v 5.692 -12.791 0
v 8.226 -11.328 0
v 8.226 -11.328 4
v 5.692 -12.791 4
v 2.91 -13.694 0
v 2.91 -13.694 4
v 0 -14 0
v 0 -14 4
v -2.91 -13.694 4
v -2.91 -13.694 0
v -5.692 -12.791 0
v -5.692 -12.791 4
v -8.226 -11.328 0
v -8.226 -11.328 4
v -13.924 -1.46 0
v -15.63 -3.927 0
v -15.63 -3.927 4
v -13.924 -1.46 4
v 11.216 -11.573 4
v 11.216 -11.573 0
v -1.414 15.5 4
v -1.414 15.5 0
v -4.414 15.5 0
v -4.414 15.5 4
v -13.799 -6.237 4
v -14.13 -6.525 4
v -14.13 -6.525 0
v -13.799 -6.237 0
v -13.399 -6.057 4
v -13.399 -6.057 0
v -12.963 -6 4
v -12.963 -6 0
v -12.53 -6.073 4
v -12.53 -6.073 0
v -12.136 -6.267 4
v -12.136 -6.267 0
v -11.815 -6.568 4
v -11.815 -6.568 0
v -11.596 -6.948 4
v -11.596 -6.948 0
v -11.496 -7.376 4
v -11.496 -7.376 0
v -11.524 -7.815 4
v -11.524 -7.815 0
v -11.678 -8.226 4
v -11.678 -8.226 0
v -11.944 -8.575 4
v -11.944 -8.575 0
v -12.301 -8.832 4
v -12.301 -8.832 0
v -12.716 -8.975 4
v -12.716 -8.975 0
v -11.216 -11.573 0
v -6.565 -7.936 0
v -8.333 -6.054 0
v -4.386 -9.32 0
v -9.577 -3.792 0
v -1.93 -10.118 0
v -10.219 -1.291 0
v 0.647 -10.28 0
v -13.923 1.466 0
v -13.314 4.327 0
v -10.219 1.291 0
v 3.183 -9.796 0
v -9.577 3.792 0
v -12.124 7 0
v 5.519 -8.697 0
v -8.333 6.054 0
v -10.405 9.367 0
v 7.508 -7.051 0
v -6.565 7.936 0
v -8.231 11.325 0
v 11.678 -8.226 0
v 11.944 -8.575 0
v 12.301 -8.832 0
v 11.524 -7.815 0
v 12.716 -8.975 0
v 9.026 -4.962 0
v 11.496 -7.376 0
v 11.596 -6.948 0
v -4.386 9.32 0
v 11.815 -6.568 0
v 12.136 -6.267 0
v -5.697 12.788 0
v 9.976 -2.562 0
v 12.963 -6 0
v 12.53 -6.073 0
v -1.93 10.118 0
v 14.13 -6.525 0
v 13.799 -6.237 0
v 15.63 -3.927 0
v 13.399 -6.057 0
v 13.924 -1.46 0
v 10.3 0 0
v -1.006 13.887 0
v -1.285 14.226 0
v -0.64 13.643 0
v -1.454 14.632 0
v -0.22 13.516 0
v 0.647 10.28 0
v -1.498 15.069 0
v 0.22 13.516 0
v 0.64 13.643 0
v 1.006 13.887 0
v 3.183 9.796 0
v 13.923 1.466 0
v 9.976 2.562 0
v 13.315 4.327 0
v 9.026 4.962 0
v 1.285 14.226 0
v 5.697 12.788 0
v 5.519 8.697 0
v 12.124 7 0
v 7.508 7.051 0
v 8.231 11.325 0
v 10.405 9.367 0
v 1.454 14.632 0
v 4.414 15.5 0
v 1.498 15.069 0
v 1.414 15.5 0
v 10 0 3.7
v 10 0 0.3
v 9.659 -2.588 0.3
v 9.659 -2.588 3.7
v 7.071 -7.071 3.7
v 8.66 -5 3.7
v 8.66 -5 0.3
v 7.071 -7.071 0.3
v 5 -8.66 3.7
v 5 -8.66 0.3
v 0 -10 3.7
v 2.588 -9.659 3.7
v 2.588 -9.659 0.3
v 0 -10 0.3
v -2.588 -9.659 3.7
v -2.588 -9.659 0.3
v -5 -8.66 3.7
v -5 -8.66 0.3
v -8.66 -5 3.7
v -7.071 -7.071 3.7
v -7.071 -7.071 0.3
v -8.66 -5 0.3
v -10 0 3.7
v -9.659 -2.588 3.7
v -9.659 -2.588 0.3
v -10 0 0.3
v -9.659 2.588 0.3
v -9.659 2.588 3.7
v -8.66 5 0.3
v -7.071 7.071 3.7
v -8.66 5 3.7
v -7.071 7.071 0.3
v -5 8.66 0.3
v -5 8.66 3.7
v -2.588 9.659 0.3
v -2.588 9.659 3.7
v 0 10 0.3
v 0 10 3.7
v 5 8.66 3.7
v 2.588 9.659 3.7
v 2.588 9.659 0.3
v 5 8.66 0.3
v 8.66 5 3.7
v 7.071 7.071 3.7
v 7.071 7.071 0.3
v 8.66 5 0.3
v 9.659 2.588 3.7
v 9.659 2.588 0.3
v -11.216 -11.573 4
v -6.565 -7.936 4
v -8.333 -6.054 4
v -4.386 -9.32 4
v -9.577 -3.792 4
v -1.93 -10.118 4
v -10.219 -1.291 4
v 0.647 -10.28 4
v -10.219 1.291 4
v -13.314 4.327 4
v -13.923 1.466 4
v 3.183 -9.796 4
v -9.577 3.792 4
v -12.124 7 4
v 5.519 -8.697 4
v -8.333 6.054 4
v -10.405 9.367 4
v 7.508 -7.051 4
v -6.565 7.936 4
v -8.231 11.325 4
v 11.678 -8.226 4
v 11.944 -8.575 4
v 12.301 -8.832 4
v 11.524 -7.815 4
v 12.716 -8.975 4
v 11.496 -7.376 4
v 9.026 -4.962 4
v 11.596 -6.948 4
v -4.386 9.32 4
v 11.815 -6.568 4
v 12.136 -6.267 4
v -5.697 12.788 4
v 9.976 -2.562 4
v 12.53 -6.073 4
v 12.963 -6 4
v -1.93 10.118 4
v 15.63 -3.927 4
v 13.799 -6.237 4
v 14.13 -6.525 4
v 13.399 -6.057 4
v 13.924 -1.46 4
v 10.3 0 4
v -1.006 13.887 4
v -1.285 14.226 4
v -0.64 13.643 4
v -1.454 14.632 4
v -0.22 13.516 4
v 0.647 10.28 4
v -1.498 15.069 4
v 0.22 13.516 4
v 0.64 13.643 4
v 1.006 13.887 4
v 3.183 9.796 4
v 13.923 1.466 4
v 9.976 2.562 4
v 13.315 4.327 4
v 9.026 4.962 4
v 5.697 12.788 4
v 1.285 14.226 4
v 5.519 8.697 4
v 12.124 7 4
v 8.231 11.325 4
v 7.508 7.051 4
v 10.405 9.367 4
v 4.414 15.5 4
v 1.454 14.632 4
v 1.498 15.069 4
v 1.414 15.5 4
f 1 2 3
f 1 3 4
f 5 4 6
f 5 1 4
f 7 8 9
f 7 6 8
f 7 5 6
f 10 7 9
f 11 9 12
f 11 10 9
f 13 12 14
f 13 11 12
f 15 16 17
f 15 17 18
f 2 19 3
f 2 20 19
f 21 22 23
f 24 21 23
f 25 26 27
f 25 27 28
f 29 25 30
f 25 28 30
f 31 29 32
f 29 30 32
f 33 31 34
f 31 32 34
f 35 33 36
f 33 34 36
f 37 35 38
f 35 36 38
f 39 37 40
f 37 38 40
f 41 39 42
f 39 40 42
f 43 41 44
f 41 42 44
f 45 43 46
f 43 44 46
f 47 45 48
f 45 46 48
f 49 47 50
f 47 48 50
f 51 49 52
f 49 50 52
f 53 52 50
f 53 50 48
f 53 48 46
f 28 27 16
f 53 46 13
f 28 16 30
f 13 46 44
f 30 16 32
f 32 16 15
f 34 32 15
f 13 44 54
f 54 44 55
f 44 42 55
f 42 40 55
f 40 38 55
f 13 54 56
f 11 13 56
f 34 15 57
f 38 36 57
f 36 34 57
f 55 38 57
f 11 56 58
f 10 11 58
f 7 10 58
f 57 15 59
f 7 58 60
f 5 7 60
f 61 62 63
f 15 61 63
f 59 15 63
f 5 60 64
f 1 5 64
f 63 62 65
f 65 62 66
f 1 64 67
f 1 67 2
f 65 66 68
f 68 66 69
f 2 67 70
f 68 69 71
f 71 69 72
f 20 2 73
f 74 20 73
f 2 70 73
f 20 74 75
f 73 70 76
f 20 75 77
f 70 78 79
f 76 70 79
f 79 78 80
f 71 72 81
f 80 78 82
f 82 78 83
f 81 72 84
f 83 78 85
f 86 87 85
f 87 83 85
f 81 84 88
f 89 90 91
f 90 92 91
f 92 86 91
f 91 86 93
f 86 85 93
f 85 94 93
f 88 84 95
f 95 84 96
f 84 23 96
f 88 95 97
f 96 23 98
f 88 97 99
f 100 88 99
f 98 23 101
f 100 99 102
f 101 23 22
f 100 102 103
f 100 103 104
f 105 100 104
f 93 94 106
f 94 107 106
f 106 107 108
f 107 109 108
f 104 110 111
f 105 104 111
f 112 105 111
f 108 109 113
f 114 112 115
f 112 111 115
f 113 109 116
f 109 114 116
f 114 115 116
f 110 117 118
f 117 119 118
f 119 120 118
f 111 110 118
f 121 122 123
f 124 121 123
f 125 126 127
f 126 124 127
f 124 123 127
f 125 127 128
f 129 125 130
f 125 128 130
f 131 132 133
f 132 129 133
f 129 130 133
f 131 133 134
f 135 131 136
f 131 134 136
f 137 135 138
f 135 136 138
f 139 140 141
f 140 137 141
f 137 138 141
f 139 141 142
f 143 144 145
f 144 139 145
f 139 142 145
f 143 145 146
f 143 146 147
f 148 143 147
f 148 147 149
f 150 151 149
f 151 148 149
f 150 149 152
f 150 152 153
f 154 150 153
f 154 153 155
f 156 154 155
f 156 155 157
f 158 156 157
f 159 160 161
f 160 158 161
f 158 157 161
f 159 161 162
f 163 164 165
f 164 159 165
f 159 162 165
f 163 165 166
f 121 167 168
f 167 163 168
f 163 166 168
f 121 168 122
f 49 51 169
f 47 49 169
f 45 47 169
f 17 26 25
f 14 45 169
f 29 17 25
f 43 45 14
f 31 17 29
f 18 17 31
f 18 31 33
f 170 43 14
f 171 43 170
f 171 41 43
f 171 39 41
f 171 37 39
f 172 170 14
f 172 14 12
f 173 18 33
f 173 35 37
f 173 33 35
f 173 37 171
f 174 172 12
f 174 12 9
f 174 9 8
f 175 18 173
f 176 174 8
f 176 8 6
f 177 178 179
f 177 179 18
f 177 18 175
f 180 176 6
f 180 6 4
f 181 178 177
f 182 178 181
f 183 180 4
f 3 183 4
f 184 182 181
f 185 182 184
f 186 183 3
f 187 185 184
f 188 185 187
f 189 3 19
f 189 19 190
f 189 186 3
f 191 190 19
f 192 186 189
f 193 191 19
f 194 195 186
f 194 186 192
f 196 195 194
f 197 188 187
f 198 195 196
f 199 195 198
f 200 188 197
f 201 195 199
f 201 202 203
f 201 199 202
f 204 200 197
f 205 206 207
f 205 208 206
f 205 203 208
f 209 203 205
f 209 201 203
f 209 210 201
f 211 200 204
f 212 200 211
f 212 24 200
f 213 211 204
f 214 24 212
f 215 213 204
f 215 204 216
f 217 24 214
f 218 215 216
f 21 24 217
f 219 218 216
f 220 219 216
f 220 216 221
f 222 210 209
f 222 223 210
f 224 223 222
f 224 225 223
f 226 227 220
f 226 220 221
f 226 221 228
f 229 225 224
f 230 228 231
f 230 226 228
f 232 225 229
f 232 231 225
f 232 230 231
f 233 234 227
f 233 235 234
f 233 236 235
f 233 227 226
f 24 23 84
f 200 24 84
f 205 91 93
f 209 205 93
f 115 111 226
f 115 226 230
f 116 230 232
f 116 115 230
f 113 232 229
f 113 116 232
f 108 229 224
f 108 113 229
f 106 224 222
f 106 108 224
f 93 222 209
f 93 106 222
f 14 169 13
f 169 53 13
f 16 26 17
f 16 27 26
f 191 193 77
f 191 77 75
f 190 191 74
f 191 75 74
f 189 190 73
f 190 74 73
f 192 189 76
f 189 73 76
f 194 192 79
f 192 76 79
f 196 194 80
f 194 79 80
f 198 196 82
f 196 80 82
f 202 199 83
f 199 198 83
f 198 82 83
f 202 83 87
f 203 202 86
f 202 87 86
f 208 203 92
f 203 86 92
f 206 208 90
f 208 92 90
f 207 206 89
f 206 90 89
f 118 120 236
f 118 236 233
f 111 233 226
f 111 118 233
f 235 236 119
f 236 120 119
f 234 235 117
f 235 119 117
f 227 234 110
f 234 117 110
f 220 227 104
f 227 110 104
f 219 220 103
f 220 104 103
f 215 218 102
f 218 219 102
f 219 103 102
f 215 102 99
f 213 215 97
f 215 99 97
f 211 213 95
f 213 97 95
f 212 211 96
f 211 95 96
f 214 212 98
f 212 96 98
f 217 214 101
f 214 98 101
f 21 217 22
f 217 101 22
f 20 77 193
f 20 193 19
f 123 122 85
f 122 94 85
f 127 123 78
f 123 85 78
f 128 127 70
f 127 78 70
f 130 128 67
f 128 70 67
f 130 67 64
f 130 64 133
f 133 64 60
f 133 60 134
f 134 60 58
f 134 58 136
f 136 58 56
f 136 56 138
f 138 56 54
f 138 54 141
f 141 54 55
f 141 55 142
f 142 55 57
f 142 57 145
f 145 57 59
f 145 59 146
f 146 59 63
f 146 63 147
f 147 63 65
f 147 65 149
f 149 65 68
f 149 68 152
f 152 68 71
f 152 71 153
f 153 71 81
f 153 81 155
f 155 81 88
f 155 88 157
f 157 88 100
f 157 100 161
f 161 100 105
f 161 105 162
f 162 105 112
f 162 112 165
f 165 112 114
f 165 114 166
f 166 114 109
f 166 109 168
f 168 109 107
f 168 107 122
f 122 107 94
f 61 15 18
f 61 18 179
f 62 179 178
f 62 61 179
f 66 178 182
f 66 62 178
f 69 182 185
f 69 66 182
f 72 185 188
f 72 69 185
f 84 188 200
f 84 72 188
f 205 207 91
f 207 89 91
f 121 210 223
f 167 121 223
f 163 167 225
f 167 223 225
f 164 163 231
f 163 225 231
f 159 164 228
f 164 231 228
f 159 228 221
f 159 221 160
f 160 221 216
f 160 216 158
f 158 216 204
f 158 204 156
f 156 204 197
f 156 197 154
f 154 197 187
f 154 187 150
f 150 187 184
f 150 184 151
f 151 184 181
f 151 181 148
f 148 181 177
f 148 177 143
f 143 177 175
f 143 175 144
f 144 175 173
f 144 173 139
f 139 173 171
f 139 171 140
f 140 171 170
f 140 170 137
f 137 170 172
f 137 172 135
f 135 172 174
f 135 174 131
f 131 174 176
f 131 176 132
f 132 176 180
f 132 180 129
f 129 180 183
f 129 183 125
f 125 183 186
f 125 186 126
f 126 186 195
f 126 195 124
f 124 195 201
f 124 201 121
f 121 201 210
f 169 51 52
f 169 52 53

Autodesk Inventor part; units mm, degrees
ref_plane "YZ Plane" through (0, 0, 0) normal (1, 0, 0) x (0, 1, 0)
ref_plane "XZ Plane" through (0, 0, 0) normal (0, 1, 0) x (-1, 0, 0)
ref_plane "XY Plane" through (0, 0, 0) normal (0, 0, 1) x (1, 0, 0)
sketch "Sketch1" plane through (0, 0, 0) normal (0, 0, 1) x (1, 0, 0)
  circle A0 centre (0, 0) radius 10
  arc A1 (-1.4142, 15.5) -> (1.4142, 15.5) centre (0, 15) ccw
  line L0 (1.4142, 15.5) -> (4.4142, 15.5)
  line L1 (-1.4142, 15.5) -> (-4.4142, 15.5)
  line L2 (-4.4142, 15.5) -> (-5.6974, 12.7883)
  line L3 (4.4142, 15.5) -> (5.6974, 12.7883)
  arc A2 (-12.7163, -8.9747) -> (-14.1305, -6.5253) centre (-12.9904, -7.5) ccw
  line L4 (-14.1305, -6.5253) -> (-15.6305, -3.9272)
  line L5 (-12.7163, -8.9747) -> (-11.2163, -11.5728)
  line L6 (-11.2163, -11.5728) -> (-8.2263, -11.3282)
  line L7 (-15.6305, -3.9272) -> (-13.9237, -1.4601)
  arc A3 (14.1305, -6.5253) -> (12.7163, -8.9747) centre (12.9904, -7.5) ccw
  line L8 (12.7163, -8.9747) -> (11.2163, -11.5728)
  line L9 (14.1305, -6.5253) -> (15.6305, -3.9272)
  line L10 (15.6305, -3.9272) -> (13.9237, -1.4601)
  line L11 (11.2163, -11.5728) -> (8.2263, -11.3282)
  arc A4 (-5.6974, 12.7883) -> (-13.9237, -1.4601) centre (0, 0) ccw
  arc A5 (-8.2263, -11.3282) -> (8.2263, -11.3282) centre (0, 0) ccw
  arc A6 (13.9237, -1.4601) -> (5.6974, 12.7883) centre (0, 0) ccw
  dimension "d0" = 20
  dimension "d1" = 3
  dimension "d3" = 15
  dimension "d4" = 3
  dimension "d5" = 0.5
  dimension "d6" = 3
  dimension "d9" = 360
  dimension "d11" = 14
extrude "Extrusion1" add sketch "Sketch1" along normal blind 4
chamfer "Chamfer1" distance 0.3 angle 45 2 edges at (-10, 0, 0) (-10, 0, 4)
properties part number "filament_guide_element" material "ABS Plastic"
